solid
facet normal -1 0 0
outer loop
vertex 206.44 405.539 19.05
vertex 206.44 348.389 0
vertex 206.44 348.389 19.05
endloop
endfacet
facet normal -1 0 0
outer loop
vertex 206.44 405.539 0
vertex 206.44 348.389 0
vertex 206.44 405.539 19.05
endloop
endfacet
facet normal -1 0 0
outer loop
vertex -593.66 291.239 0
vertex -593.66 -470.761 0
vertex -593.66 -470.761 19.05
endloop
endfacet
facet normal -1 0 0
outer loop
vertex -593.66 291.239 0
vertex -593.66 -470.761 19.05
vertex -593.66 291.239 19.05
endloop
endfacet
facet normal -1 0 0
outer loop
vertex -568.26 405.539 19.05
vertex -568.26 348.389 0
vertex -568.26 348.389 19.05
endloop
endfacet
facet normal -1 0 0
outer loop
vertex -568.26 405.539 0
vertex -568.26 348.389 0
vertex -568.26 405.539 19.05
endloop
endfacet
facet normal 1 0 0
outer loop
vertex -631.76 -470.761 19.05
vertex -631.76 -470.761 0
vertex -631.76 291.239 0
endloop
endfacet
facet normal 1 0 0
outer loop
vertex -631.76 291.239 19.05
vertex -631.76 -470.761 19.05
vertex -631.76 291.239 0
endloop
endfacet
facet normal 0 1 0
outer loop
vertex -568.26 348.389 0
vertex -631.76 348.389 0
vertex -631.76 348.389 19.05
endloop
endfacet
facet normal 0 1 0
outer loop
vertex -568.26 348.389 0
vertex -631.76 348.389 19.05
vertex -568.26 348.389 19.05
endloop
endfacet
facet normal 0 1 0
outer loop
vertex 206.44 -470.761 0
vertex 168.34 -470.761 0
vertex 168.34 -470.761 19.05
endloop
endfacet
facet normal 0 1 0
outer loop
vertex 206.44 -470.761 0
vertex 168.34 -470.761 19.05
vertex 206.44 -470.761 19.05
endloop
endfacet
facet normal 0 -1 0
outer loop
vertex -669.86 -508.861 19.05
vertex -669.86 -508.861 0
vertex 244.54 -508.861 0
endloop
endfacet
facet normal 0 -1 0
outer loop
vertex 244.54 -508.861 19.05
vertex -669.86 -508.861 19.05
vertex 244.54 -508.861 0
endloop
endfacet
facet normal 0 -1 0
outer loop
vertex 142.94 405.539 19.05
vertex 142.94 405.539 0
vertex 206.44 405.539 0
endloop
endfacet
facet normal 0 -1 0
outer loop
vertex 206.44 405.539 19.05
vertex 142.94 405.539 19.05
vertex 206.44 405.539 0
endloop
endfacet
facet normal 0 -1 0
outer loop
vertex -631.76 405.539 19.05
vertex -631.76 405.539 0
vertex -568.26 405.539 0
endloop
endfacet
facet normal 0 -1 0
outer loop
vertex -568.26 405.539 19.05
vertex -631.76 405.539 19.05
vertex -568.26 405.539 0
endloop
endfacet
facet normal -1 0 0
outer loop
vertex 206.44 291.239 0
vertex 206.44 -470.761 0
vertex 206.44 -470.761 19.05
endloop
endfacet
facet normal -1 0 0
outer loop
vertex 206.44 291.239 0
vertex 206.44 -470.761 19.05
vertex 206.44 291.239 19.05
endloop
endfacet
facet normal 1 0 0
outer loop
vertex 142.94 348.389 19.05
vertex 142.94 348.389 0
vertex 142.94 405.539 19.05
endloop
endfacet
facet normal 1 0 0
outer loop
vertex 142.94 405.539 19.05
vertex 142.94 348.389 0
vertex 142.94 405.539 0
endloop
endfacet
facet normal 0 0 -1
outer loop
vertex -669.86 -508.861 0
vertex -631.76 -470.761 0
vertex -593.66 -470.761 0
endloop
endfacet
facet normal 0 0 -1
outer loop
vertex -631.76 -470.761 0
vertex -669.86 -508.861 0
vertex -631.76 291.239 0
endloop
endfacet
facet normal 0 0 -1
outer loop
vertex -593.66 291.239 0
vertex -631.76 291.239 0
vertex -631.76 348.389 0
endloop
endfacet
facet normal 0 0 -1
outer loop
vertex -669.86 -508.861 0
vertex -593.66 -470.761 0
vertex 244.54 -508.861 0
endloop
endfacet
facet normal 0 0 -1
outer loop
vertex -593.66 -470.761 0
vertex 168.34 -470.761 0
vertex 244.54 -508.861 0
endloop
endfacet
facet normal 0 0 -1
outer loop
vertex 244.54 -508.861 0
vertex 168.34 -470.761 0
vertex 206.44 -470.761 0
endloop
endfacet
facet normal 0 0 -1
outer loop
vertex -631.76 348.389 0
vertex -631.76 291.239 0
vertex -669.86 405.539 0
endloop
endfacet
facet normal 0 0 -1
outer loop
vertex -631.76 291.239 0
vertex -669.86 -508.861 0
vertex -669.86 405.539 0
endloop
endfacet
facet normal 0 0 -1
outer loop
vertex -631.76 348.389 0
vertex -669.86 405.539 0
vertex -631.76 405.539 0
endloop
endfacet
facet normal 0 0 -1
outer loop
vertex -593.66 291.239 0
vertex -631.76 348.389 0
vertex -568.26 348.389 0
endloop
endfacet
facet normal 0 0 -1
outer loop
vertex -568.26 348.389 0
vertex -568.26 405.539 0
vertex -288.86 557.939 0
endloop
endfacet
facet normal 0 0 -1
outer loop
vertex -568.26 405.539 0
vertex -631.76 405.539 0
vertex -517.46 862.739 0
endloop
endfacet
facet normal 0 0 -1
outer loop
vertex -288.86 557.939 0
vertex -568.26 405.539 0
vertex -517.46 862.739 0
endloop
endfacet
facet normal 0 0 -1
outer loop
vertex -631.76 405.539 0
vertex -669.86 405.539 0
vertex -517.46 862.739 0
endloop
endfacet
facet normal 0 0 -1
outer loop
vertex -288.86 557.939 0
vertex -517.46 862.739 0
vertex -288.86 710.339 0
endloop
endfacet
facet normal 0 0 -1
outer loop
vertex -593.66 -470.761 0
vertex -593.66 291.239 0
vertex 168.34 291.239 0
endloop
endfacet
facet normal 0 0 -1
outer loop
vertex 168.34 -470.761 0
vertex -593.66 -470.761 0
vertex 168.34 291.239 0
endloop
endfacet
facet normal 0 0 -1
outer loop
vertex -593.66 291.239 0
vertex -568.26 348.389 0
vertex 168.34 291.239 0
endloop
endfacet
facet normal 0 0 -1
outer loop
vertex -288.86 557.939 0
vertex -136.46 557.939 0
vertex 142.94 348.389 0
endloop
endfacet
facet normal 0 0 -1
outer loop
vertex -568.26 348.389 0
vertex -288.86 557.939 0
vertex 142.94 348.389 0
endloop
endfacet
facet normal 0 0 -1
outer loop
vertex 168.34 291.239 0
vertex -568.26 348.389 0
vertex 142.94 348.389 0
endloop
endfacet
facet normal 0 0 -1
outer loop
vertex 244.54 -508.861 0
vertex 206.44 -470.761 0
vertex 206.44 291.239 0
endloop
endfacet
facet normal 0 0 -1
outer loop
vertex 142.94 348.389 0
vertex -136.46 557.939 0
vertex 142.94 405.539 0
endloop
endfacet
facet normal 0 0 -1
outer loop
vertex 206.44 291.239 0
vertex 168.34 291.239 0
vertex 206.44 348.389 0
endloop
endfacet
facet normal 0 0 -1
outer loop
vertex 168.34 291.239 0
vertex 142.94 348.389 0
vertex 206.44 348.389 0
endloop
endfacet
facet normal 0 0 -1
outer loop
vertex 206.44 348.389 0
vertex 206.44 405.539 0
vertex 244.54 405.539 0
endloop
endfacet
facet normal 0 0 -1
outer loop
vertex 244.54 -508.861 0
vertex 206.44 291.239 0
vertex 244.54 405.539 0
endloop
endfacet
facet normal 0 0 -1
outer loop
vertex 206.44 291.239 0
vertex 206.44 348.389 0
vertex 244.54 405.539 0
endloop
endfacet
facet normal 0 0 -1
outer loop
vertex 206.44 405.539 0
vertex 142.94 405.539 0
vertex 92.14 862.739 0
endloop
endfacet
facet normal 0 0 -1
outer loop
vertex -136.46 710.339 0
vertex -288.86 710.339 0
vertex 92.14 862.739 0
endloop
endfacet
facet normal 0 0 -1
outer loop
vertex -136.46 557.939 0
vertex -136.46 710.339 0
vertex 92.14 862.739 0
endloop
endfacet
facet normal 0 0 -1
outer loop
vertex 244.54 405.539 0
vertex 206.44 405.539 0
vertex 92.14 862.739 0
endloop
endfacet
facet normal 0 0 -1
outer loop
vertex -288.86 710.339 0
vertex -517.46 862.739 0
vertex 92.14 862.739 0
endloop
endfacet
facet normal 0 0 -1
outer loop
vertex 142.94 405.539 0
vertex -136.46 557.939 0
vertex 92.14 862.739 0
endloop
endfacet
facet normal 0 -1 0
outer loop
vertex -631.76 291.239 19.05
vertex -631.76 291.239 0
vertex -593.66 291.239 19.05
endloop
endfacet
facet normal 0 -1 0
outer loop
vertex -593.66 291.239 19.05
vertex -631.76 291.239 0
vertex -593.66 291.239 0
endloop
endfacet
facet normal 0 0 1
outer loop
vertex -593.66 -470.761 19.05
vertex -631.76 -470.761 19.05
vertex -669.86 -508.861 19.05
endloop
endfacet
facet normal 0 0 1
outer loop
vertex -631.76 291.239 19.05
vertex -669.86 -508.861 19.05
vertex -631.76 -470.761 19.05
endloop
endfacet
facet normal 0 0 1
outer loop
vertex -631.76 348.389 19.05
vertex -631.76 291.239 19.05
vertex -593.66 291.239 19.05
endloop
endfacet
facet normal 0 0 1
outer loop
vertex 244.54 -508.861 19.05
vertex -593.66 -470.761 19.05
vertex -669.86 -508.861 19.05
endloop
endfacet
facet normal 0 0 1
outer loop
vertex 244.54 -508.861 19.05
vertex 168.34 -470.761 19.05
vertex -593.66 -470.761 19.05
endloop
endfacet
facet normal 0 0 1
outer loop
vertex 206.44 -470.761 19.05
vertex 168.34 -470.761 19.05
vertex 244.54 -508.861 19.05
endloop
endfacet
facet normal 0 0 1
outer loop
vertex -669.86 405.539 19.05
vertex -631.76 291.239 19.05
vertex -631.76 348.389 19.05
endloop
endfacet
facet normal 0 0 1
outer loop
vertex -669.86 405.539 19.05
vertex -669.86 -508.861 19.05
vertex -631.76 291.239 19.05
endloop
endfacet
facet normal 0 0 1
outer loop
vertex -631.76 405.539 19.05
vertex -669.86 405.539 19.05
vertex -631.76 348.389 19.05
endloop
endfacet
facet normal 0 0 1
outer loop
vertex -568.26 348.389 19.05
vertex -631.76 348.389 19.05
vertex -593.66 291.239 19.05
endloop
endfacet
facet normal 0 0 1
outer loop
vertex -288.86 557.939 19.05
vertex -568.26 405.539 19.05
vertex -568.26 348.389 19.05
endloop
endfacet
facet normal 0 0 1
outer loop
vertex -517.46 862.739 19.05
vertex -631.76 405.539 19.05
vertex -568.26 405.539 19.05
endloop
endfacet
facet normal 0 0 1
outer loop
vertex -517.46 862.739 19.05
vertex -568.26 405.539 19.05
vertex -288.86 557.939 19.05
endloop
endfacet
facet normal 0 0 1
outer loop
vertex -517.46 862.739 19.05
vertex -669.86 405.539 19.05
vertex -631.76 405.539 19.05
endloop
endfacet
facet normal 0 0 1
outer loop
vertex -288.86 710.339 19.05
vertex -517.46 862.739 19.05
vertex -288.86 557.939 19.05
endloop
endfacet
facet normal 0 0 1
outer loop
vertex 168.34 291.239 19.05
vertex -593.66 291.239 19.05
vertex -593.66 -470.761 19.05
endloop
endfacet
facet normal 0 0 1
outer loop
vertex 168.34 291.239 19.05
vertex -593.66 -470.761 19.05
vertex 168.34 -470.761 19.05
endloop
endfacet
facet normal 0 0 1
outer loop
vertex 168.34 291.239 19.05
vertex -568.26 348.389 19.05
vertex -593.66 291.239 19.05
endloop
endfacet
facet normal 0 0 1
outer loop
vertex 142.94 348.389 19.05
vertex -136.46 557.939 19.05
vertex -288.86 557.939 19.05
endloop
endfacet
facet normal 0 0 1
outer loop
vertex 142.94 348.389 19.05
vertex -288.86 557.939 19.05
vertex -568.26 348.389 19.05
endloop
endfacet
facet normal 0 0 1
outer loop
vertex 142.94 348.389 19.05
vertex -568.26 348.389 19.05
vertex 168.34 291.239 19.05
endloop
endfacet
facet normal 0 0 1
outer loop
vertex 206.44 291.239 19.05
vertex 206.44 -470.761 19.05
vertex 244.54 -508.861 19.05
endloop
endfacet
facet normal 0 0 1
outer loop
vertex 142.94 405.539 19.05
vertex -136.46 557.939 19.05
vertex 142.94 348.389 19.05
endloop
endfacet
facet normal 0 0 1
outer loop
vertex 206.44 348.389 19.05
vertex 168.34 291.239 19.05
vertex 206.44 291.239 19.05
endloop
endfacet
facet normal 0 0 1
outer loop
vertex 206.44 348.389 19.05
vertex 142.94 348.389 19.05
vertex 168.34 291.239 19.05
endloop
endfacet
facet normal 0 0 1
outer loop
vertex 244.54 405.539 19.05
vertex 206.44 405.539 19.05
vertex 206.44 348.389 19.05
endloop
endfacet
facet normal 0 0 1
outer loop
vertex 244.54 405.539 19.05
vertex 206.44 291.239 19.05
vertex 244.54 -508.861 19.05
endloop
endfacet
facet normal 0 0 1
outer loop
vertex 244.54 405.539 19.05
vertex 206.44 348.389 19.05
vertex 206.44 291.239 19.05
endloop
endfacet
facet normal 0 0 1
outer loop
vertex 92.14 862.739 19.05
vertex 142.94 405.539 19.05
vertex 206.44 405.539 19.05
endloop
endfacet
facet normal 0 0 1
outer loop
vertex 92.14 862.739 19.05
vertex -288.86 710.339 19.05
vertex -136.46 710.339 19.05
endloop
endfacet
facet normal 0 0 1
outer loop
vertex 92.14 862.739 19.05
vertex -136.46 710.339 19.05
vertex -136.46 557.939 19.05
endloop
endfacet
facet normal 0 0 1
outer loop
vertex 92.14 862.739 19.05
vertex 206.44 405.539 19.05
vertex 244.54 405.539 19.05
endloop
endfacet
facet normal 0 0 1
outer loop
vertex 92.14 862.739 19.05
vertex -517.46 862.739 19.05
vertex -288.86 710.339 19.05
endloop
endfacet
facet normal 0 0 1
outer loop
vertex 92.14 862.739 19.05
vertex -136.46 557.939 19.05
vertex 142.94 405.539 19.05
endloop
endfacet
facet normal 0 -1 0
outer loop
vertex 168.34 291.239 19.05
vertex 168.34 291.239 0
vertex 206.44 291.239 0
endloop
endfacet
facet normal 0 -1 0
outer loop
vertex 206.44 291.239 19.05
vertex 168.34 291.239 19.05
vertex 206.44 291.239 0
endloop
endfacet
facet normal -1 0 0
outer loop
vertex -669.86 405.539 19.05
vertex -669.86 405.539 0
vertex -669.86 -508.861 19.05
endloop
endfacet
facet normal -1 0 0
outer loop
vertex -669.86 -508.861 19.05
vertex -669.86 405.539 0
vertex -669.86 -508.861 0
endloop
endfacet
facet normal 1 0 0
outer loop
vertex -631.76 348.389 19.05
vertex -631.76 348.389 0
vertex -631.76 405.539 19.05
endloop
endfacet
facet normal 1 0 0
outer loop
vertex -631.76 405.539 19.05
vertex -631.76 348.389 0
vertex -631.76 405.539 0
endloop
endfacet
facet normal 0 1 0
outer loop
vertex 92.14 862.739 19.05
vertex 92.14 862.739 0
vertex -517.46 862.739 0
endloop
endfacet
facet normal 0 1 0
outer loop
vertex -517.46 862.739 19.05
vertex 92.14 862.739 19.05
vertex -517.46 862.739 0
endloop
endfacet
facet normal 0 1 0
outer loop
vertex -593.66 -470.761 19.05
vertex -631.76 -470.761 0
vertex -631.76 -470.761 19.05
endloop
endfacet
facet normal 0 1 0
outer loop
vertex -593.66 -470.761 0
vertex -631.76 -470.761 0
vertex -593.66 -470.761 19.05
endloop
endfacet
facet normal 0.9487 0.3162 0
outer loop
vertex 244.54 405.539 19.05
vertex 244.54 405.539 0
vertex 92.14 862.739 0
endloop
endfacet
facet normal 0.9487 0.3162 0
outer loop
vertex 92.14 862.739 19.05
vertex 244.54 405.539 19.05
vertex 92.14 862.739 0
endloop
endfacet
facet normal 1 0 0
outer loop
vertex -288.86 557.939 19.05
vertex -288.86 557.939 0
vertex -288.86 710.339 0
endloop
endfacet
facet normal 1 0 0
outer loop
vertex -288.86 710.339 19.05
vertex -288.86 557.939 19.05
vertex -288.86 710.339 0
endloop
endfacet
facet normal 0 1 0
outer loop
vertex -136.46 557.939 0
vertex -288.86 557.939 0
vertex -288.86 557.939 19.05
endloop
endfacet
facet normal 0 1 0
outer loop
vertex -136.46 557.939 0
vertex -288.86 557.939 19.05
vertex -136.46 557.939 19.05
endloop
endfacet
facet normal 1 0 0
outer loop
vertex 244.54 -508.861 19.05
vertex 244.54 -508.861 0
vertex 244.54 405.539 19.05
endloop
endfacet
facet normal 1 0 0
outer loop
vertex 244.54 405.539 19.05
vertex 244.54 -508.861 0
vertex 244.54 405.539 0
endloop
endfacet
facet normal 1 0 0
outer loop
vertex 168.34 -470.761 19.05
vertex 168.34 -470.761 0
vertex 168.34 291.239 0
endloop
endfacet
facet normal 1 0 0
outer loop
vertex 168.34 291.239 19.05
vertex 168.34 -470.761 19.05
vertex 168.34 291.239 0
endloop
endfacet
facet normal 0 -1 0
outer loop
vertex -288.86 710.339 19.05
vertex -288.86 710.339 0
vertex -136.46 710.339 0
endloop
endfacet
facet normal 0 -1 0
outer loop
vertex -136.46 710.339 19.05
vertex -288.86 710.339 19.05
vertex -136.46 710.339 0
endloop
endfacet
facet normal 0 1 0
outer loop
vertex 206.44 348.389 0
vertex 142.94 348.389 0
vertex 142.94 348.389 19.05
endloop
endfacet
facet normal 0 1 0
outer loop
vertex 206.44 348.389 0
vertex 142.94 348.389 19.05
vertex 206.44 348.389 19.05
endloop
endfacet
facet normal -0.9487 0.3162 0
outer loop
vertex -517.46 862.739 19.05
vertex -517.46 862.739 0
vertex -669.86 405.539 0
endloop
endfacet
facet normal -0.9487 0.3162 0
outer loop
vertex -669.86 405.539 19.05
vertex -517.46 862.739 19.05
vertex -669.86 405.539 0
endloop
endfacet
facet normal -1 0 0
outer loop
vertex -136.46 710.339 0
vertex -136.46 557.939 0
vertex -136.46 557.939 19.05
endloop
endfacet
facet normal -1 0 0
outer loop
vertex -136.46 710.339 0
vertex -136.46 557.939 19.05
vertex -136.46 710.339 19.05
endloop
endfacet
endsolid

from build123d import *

# Parameters (mm, degrees)
F0_W     = 38.1
F0_H     = 762
F0_W_2   = 63.5
F0_H_2   = 57.15
F0_W_3   = 152.4
F0_H_3   = 152.4
F1_DEPTH = 19.05


with BuildPart() as f1:
    # F0 (on Top) → F1 (new body)
    with BuildSketch(Plane.XY):
        Polygon((-669.859934, 405.539142), (-669.859934, -508.860858), (244.540066, -508.860858), (244.540066, 405.539142), (92.140066, 862.739142), (-517.459934, 862.739142), align=None)
        with Locations((-612.709934, -89.760858)):
            Rectangle(F0_W, F0_H, mode=Mode.SUBTRACT)
        with Locations((187.390066, -89.760858)):
            Rectangle(F0_W, F0_H, mode=Mode.SUBTRACT)
        with Locations((-600.009934, 376.964142)):
            Rectangle(F0_W_2, F0_H_2, mode=Mode.SUBTRACT)
        with Locations((-212.659934, 634.139142)):
            Rectangle(F0_W_3, F0_H_3, mode=Mode.SUBTRACT)
        with Locations((174.690066, 376.964142)):
            Rectangle(F0_W_2, F0_H_2, mode=Mode.SUBTRACT)
    extrude(amount=F1_DEPTH)


solid = f1.part
